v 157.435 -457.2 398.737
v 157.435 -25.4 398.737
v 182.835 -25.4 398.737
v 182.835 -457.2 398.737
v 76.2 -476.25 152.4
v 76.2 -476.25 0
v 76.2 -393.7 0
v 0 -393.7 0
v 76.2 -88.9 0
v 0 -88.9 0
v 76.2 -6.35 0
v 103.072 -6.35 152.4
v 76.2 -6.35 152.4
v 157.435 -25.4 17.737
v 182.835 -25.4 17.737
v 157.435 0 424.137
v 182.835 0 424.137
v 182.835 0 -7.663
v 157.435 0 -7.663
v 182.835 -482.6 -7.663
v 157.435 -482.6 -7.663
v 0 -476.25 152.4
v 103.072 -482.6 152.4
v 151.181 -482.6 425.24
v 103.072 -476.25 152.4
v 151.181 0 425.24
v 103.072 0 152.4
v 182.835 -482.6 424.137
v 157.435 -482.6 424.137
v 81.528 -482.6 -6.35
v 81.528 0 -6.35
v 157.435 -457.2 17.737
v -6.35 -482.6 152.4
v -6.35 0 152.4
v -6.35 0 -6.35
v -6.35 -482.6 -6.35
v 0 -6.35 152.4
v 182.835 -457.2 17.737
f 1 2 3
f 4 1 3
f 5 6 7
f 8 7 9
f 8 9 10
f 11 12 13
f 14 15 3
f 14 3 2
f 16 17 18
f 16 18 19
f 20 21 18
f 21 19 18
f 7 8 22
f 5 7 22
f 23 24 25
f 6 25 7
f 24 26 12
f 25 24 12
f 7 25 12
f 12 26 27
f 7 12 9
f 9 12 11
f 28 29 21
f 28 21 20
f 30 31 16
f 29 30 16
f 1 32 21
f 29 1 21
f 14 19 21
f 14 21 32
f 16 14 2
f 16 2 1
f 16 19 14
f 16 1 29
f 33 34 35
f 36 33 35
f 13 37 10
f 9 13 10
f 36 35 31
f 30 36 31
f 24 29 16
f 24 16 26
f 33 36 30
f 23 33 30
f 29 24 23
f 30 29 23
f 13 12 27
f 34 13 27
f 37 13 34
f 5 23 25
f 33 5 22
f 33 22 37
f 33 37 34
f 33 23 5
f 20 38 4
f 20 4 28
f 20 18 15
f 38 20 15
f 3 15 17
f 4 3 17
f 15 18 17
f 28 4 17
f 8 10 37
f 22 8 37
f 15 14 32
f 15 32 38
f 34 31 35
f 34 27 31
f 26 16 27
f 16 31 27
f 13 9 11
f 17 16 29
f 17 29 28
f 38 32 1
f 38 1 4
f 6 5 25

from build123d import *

# Parameters (mm, degrees)
F1_DEPTH  = 482.6
F2_W      = 6.35
F2_H      = 152.4
F3_DEPTH  = 76.2
F4_W      = 6.35
F4_H      = 152.4
F5_DEPTH  = 76.2
F7_DEPTH  = 6.35
F9_DEPTH  = 6.35
F11_DEPTH = 76.2
F13_DEPTH = 76.2
F14_W     = 25.4
F14_H     = 431.8
F15_DEPTH = 25.4
F16_W     = 25.4
F16_H     = 25.4
F17_DEPTH = 431.8
F18_W     = 25.4
F18_H     = 431.8
F19_DEPTH = 25.4


with BuildPart() as f1:
    # F0 (on Front) → F1 (new body)
    with BuildSketch(Plane.XZ):
        Polygon((0, -6.35), (0, 0), (0, 152.4), (-6.35, 152.4), (-6.35, 0), (-6.35, -6.35), align=None)
        Polygon((76.2, 0), (0, 0), (0, -6.35), (81.528283, -6.35), (157.434812, 424.137322), (151.181283, 425.239988), align=None)
    extrude(amount=F1_DEPTH)

    # F2 (on face) → F3 (join)
    with BuildSketch(Plane.YZ):
        with Locations((-3.175, 76.2)):
            Rectangle(F2_W, F2_H)
    extrude(amount=F3_DEPTH)

    # F4 (on face) → F5 (join)
    with BuildSketch(Plane.YZ):
        with Locations((-479.425, 76.2)):
            Rectangle(F4_W, F4_H)
    extrude(amount=F5_DEPTH)

    # F6 (on face) → F7 (join)
    with BuildSketch(Plane(origin=(0, 0, 0), x_dir=(-1, 0, 0), z_dir=(0, 1, 0))):
        Polygon((-76.2, 0), (-76.2, 152.4), (-103.072232, 152.4), align=None)
    extrude(amount=-F7_DEPTH)

    # F8 (on face) → F9 (join)
    with BuildSketch(Plane.XZ.offset(482.6)):
        Polygon((103.072232, 152.4), (76.2, 152.4), (76.2, 0), align=None)
    extrude(amount=-F9_DEPTH)

    # F10 (on face) → F11 (join)
    with BuildSketch(Plane.YZ):
        Polygon((-6.35, 152.4), (-88.9, 0), (-6.35, 0), align=None)
    extrude(amount=F11_DEPTH)

    # F12 (on face) → F13 (join)
    with BuildSketch(Plane.YZ):
        Polygon((-476.25, 152.4), (-476.25, 0), (-393.7, 0), align=None)
    extrude(amount=F13_DEPTH)



with BuildPart() as f15:
    # F14 (on face) → F15 (new body)
    with BuildSketch(Plane(origin=(0, 0, 0), x_dir=(-1, 0, 0), z_dir=(0, 1, 0))):
        with Locations((-170.134812, 208.237322)):
            Rectangle(F14_W, F14_H)
    extrude(amount=-F15_DEPTH)


with BuildPart() as f1_1:
    add(f1.part)

    add(f15.part)  # F17 merges F15
    # F16 (on face) → F17 (join)
    with BuildSketch(Plane.XZ.offset(25.4)):
        with Locations((170.134812, 5.037322)):
            Rectangle(F16_W, F16_H)
        with Locations((170.134812, 411.437322)):
            Rectangle(F16_W, F16_H)
    extrude(amount=F17_DEPTH)

    # F18 (on face) → F19 (join)
    with BuildSketch(Plane.XZ.offset(457.2)):
        with Locations((170.134812, 208.237322)):
            Rectangle(F18_W, F18_H)
    extrude(amount=F19_DEPTH)


solid = f1_1.part
